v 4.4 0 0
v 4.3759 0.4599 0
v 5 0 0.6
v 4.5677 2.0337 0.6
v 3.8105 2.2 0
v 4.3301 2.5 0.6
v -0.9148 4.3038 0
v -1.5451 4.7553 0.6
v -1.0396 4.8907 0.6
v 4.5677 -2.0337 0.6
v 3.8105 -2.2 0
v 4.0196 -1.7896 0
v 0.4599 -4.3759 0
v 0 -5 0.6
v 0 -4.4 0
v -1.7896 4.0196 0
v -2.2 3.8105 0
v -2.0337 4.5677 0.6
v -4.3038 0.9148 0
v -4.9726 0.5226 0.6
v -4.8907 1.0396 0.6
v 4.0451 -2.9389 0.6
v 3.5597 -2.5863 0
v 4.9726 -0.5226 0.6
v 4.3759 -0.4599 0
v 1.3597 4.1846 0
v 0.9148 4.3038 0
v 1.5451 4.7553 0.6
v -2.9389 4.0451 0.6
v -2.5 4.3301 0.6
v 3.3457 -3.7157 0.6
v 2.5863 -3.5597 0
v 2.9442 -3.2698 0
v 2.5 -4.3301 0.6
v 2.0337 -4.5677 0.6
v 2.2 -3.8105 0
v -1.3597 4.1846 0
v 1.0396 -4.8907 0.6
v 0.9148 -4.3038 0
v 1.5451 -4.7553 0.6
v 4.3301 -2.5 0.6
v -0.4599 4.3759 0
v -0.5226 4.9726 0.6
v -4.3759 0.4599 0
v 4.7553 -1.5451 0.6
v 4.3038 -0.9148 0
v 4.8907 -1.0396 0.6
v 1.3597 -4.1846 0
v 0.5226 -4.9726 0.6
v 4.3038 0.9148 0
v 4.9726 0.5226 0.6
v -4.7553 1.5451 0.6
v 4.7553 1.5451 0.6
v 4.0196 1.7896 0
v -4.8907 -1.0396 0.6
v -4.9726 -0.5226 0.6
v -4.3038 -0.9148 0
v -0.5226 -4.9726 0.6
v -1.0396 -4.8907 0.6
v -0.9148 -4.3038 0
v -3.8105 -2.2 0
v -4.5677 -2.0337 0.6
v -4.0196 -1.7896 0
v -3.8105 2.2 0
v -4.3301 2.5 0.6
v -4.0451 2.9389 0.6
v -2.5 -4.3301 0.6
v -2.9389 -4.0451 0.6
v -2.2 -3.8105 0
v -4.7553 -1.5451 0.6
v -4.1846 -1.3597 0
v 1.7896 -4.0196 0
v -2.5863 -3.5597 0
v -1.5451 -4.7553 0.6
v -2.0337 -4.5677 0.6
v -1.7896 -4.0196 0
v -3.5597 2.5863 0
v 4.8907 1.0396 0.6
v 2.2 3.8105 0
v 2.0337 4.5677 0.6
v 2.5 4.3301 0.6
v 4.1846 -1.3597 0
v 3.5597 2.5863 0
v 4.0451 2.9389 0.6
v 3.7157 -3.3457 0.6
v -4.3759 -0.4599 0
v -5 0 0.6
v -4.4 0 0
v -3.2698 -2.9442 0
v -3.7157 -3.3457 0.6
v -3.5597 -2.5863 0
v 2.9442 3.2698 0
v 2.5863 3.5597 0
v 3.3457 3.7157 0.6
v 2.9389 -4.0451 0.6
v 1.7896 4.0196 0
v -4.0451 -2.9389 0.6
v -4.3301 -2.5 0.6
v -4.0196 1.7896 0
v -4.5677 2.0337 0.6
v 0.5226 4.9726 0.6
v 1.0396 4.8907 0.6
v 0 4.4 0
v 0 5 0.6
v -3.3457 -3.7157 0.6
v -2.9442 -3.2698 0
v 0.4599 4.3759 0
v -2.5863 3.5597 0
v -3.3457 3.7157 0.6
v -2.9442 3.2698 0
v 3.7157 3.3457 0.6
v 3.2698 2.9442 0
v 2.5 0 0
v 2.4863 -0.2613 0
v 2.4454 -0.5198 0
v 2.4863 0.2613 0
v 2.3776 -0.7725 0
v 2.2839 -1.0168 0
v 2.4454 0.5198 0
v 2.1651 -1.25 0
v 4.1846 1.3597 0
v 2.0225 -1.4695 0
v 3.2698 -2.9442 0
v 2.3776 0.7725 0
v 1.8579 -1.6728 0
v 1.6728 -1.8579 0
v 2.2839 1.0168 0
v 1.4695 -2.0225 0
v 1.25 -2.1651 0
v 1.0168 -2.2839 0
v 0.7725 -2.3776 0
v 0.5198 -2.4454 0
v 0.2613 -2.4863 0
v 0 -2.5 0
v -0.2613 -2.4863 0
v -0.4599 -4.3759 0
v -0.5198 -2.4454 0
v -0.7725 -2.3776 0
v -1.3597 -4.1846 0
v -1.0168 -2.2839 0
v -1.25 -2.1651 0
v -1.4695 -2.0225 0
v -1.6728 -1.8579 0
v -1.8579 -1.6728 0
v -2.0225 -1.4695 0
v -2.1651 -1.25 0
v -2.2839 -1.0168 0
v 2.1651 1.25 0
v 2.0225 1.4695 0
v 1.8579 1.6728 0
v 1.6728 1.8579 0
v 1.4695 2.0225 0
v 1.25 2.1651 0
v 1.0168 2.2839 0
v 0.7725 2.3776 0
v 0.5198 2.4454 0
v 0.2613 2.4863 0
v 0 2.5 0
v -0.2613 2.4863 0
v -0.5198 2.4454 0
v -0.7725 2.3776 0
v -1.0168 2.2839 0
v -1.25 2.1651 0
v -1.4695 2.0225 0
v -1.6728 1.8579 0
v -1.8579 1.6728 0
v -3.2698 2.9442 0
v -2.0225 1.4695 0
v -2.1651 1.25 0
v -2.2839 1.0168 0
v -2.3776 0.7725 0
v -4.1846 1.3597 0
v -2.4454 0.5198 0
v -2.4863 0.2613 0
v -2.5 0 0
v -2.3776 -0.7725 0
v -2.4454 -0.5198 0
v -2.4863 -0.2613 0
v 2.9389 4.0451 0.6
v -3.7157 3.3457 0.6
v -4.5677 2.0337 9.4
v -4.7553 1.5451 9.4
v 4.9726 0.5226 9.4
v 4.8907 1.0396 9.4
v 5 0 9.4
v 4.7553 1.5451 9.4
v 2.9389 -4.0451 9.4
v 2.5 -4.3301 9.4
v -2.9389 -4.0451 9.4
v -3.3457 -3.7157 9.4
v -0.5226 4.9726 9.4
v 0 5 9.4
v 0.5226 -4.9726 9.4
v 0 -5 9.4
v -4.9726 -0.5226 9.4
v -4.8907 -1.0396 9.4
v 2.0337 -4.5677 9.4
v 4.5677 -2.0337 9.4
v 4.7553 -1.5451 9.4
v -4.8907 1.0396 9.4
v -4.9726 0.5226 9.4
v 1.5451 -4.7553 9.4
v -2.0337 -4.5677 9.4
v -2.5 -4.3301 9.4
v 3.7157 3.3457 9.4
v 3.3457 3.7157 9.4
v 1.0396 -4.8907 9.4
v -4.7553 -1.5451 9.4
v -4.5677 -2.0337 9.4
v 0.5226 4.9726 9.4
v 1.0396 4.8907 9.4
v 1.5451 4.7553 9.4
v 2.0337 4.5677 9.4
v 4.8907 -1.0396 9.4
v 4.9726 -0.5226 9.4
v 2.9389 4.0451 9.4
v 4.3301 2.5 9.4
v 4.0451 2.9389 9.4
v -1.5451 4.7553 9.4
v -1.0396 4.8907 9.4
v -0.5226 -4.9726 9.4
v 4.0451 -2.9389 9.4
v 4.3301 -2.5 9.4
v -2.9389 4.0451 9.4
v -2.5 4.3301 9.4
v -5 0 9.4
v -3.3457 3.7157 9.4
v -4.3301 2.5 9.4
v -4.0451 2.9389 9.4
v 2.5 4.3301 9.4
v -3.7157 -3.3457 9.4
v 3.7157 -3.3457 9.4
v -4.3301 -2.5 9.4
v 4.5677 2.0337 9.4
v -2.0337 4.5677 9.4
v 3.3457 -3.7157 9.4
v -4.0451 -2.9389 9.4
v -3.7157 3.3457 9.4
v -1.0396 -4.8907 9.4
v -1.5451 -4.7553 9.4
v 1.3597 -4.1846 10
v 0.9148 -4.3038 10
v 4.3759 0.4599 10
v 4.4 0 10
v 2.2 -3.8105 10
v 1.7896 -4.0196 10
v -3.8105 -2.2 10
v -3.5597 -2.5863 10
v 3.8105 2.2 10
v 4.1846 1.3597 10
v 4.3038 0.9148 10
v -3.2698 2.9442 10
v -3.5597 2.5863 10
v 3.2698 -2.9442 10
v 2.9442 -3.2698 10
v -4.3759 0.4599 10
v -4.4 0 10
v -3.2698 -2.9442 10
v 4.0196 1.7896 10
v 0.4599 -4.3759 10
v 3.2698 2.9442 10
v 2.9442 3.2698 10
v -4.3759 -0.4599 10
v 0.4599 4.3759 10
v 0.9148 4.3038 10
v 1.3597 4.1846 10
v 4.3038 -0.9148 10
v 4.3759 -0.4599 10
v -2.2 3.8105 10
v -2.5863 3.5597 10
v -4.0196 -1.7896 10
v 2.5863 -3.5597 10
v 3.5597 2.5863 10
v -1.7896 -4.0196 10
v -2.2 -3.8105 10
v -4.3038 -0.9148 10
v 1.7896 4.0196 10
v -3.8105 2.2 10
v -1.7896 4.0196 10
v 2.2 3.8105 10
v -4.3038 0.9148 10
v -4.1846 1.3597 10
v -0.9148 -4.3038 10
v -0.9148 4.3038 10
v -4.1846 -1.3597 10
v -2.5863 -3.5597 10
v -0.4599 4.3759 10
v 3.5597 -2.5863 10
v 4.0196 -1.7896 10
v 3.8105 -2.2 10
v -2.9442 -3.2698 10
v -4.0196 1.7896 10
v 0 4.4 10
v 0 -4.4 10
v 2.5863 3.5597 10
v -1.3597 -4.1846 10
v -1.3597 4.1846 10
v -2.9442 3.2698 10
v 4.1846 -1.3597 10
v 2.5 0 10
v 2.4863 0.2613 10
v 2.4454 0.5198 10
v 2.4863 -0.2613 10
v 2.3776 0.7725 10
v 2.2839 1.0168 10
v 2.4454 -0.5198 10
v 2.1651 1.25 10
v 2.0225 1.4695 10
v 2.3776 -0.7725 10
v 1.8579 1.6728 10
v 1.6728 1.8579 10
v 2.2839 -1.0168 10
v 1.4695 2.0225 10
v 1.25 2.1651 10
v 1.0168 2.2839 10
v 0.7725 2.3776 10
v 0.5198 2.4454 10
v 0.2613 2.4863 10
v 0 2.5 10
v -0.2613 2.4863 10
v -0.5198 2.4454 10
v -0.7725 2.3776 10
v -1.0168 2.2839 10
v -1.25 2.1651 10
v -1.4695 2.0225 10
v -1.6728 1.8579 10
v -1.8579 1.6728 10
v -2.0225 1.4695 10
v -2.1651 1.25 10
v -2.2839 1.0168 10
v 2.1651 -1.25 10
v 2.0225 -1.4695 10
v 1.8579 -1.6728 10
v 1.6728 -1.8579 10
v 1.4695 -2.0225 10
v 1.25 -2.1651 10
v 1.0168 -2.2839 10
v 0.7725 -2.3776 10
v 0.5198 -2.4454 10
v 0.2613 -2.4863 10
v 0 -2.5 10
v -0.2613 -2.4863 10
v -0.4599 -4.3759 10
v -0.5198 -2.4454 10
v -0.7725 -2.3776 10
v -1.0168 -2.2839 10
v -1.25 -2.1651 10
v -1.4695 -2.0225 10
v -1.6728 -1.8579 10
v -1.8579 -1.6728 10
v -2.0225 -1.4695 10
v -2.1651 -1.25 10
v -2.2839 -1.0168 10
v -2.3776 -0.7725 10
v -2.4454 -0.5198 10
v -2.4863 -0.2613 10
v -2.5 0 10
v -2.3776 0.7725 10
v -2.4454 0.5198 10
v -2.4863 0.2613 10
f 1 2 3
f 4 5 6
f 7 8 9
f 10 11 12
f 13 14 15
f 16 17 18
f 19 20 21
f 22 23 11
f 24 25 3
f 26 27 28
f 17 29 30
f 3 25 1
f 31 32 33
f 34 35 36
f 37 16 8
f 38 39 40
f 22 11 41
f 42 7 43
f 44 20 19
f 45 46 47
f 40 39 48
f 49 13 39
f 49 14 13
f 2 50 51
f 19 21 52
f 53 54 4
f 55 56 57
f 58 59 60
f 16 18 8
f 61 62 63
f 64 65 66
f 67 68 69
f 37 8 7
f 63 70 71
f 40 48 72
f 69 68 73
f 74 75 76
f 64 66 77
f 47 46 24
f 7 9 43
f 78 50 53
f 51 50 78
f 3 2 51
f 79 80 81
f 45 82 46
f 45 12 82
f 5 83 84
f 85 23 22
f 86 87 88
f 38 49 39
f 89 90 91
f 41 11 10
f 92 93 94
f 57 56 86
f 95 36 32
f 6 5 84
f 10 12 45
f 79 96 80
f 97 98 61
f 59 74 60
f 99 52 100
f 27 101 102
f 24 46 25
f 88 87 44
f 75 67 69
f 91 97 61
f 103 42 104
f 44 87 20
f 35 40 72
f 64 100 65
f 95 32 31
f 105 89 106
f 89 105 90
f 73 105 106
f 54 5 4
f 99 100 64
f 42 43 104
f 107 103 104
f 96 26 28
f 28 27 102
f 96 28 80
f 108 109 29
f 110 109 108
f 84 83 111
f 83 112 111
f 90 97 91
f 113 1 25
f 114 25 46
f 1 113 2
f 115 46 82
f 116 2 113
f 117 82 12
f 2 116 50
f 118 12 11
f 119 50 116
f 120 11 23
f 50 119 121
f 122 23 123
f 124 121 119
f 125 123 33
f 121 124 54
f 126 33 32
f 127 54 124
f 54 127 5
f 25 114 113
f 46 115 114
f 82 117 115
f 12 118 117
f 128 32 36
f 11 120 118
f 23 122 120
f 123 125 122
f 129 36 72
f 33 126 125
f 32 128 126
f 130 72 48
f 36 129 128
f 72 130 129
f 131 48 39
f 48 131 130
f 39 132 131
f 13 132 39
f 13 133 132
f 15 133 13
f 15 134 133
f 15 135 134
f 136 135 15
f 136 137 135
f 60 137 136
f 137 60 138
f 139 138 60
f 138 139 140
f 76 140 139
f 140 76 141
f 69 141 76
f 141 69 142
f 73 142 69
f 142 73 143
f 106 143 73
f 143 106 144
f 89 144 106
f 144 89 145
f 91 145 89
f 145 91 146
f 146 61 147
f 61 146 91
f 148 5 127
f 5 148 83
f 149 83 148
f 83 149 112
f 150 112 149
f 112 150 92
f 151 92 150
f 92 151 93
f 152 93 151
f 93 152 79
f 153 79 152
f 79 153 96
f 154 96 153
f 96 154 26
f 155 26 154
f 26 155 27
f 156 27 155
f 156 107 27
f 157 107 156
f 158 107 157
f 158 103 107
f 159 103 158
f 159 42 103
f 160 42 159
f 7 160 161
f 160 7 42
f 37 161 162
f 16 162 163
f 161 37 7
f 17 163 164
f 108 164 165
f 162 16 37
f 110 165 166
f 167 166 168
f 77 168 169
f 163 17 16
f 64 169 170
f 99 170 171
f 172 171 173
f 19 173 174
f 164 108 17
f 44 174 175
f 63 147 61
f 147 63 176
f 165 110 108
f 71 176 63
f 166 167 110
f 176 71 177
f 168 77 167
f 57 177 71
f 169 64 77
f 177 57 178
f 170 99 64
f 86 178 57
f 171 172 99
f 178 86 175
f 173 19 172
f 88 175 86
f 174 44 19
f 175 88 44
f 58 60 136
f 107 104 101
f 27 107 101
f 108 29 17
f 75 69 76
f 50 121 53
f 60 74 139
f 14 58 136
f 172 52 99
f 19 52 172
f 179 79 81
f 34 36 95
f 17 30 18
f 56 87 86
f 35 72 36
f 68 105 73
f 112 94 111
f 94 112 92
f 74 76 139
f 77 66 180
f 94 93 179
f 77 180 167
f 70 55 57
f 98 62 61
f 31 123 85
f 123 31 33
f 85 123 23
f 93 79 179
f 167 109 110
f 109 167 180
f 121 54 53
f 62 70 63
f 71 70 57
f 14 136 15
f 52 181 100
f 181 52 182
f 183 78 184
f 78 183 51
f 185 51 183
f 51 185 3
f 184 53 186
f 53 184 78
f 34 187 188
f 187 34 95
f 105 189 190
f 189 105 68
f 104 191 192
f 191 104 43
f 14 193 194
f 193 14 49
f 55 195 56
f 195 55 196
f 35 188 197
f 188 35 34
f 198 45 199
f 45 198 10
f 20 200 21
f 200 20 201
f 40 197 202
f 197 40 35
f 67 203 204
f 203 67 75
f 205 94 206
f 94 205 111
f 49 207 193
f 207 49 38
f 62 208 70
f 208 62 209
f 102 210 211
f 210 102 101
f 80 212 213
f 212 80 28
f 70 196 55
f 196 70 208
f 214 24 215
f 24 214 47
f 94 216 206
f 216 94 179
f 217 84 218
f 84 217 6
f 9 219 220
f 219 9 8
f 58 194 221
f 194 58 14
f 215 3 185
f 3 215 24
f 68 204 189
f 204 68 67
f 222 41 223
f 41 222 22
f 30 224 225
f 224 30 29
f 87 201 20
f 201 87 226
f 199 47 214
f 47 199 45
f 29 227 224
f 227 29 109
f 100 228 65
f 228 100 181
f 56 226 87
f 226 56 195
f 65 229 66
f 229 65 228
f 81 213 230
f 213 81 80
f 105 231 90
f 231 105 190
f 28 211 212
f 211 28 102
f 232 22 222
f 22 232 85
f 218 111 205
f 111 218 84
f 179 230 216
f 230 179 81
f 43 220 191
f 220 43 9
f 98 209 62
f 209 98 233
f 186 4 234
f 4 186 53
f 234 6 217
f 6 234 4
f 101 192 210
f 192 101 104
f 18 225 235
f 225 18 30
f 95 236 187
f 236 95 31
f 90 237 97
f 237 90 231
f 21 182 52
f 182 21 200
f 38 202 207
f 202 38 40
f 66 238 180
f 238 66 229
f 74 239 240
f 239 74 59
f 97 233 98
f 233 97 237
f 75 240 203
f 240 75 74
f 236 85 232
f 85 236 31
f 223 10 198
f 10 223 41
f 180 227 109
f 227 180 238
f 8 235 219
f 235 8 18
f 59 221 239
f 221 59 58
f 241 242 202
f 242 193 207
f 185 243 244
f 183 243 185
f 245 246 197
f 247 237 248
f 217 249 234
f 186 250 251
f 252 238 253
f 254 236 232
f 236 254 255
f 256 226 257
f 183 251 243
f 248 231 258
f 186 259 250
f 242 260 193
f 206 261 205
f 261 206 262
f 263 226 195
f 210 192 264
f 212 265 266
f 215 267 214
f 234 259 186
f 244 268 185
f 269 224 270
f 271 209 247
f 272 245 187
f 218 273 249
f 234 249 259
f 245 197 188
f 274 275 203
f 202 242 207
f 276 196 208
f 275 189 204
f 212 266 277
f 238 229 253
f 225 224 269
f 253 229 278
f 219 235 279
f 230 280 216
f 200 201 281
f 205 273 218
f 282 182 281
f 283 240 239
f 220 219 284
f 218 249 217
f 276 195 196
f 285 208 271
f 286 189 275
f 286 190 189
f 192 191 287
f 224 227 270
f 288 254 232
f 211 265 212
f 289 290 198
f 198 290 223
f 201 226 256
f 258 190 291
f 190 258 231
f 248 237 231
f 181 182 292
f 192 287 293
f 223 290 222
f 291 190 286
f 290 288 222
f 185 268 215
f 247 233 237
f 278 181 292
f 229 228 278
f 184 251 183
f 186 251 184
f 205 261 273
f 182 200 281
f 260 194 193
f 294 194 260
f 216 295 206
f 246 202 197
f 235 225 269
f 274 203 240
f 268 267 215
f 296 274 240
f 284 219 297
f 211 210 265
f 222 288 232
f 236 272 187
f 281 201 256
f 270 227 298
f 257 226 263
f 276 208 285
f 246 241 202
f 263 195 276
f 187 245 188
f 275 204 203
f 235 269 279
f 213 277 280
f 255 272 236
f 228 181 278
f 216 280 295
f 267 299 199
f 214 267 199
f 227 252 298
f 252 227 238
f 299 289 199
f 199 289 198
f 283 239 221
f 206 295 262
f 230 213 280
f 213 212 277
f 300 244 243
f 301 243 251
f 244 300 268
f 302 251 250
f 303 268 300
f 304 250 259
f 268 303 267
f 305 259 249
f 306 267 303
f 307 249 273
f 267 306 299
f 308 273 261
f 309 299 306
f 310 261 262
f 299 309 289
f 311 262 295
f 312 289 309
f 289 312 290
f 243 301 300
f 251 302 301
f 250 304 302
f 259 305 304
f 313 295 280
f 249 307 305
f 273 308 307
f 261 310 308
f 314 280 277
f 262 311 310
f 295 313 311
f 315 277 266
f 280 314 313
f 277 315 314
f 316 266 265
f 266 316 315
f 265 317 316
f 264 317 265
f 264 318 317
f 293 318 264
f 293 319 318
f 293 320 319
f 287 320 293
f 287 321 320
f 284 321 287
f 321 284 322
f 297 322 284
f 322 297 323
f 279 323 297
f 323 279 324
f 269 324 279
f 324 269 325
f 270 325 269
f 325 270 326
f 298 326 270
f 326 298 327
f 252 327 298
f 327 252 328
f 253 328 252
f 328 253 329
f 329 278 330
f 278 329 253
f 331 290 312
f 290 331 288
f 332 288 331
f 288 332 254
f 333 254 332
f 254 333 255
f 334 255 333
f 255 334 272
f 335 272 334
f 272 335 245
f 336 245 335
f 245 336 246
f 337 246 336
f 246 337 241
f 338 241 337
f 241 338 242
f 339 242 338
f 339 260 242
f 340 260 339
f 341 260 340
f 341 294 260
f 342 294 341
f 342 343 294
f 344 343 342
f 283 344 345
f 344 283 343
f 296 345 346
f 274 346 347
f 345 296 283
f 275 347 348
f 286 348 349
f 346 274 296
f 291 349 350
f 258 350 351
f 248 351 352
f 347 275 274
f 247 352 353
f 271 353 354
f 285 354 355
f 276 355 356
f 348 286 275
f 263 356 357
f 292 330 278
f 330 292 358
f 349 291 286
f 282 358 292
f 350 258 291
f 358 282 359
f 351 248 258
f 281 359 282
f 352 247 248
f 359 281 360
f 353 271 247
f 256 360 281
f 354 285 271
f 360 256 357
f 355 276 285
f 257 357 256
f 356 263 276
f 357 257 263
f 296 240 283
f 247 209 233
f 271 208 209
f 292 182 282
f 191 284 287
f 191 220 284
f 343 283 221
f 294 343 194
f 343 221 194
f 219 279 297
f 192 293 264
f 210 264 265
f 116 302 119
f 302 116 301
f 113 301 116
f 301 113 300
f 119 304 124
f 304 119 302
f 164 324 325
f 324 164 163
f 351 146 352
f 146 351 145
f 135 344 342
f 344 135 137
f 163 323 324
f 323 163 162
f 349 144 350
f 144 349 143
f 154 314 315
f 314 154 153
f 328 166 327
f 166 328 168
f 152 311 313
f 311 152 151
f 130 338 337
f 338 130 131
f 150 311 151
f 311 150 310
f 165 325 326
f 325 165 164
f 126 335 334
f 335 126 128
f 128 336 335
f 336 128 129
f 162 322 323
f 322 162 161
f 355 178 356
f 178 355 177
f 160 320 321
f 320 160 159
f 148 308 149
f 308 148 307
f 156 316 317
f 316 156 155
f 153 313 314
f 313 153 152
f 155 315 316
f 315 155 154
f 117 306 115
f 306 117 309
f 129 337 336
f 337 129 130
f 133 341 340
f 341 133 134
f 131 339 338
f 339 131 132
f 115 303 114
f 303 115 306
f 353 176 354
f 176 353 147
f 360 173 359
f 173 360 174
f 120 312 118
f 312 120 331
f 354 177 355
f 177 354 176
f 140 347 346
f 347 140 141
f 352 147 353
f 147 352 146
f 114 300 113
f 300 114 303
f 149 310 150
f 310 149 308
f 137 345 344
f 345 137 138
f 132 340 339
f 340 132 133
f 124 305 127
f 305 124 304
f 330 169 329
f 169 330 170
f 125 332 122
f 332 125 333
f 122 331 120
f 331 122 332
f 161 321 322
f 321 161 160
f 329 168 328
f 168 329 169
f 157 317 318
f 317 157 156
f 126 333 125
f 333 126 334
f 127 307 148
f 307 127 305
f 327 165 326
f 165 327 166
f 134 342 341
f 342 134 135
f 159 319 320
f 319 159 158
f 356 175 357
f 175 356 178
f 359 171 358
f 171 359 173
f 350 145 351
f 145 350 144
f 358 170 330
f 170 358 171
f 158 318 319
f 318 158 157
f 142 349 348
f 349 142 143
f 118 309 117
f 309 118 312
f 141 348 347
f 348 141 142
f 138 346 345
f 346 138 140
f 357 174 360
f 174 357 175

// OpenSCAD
// Plain sleeve bushing.
$fn = 60;
eps = 0.02;
inner_d = 5;
outer_d = 10;
length = 10;
chamfer = 0.6;
difference() {
    union() {
        cylinder(d1 = outer_d - 2 * chamfer, d2 = outer_d, h = chamfer);
        translate([0, 0, chamfer]) cylinder(d = outer_d, h = length - 2 * chamfer);
        translate([0, 0, length - chamfer]) cylinder(d1 = outer_d, d2 = outer_d - 2 * chamfer, h = chamfer);
    }
    translate([0, 0, -eps]) cylinder(d = inner_d, h = length + 2 * eps);
}
